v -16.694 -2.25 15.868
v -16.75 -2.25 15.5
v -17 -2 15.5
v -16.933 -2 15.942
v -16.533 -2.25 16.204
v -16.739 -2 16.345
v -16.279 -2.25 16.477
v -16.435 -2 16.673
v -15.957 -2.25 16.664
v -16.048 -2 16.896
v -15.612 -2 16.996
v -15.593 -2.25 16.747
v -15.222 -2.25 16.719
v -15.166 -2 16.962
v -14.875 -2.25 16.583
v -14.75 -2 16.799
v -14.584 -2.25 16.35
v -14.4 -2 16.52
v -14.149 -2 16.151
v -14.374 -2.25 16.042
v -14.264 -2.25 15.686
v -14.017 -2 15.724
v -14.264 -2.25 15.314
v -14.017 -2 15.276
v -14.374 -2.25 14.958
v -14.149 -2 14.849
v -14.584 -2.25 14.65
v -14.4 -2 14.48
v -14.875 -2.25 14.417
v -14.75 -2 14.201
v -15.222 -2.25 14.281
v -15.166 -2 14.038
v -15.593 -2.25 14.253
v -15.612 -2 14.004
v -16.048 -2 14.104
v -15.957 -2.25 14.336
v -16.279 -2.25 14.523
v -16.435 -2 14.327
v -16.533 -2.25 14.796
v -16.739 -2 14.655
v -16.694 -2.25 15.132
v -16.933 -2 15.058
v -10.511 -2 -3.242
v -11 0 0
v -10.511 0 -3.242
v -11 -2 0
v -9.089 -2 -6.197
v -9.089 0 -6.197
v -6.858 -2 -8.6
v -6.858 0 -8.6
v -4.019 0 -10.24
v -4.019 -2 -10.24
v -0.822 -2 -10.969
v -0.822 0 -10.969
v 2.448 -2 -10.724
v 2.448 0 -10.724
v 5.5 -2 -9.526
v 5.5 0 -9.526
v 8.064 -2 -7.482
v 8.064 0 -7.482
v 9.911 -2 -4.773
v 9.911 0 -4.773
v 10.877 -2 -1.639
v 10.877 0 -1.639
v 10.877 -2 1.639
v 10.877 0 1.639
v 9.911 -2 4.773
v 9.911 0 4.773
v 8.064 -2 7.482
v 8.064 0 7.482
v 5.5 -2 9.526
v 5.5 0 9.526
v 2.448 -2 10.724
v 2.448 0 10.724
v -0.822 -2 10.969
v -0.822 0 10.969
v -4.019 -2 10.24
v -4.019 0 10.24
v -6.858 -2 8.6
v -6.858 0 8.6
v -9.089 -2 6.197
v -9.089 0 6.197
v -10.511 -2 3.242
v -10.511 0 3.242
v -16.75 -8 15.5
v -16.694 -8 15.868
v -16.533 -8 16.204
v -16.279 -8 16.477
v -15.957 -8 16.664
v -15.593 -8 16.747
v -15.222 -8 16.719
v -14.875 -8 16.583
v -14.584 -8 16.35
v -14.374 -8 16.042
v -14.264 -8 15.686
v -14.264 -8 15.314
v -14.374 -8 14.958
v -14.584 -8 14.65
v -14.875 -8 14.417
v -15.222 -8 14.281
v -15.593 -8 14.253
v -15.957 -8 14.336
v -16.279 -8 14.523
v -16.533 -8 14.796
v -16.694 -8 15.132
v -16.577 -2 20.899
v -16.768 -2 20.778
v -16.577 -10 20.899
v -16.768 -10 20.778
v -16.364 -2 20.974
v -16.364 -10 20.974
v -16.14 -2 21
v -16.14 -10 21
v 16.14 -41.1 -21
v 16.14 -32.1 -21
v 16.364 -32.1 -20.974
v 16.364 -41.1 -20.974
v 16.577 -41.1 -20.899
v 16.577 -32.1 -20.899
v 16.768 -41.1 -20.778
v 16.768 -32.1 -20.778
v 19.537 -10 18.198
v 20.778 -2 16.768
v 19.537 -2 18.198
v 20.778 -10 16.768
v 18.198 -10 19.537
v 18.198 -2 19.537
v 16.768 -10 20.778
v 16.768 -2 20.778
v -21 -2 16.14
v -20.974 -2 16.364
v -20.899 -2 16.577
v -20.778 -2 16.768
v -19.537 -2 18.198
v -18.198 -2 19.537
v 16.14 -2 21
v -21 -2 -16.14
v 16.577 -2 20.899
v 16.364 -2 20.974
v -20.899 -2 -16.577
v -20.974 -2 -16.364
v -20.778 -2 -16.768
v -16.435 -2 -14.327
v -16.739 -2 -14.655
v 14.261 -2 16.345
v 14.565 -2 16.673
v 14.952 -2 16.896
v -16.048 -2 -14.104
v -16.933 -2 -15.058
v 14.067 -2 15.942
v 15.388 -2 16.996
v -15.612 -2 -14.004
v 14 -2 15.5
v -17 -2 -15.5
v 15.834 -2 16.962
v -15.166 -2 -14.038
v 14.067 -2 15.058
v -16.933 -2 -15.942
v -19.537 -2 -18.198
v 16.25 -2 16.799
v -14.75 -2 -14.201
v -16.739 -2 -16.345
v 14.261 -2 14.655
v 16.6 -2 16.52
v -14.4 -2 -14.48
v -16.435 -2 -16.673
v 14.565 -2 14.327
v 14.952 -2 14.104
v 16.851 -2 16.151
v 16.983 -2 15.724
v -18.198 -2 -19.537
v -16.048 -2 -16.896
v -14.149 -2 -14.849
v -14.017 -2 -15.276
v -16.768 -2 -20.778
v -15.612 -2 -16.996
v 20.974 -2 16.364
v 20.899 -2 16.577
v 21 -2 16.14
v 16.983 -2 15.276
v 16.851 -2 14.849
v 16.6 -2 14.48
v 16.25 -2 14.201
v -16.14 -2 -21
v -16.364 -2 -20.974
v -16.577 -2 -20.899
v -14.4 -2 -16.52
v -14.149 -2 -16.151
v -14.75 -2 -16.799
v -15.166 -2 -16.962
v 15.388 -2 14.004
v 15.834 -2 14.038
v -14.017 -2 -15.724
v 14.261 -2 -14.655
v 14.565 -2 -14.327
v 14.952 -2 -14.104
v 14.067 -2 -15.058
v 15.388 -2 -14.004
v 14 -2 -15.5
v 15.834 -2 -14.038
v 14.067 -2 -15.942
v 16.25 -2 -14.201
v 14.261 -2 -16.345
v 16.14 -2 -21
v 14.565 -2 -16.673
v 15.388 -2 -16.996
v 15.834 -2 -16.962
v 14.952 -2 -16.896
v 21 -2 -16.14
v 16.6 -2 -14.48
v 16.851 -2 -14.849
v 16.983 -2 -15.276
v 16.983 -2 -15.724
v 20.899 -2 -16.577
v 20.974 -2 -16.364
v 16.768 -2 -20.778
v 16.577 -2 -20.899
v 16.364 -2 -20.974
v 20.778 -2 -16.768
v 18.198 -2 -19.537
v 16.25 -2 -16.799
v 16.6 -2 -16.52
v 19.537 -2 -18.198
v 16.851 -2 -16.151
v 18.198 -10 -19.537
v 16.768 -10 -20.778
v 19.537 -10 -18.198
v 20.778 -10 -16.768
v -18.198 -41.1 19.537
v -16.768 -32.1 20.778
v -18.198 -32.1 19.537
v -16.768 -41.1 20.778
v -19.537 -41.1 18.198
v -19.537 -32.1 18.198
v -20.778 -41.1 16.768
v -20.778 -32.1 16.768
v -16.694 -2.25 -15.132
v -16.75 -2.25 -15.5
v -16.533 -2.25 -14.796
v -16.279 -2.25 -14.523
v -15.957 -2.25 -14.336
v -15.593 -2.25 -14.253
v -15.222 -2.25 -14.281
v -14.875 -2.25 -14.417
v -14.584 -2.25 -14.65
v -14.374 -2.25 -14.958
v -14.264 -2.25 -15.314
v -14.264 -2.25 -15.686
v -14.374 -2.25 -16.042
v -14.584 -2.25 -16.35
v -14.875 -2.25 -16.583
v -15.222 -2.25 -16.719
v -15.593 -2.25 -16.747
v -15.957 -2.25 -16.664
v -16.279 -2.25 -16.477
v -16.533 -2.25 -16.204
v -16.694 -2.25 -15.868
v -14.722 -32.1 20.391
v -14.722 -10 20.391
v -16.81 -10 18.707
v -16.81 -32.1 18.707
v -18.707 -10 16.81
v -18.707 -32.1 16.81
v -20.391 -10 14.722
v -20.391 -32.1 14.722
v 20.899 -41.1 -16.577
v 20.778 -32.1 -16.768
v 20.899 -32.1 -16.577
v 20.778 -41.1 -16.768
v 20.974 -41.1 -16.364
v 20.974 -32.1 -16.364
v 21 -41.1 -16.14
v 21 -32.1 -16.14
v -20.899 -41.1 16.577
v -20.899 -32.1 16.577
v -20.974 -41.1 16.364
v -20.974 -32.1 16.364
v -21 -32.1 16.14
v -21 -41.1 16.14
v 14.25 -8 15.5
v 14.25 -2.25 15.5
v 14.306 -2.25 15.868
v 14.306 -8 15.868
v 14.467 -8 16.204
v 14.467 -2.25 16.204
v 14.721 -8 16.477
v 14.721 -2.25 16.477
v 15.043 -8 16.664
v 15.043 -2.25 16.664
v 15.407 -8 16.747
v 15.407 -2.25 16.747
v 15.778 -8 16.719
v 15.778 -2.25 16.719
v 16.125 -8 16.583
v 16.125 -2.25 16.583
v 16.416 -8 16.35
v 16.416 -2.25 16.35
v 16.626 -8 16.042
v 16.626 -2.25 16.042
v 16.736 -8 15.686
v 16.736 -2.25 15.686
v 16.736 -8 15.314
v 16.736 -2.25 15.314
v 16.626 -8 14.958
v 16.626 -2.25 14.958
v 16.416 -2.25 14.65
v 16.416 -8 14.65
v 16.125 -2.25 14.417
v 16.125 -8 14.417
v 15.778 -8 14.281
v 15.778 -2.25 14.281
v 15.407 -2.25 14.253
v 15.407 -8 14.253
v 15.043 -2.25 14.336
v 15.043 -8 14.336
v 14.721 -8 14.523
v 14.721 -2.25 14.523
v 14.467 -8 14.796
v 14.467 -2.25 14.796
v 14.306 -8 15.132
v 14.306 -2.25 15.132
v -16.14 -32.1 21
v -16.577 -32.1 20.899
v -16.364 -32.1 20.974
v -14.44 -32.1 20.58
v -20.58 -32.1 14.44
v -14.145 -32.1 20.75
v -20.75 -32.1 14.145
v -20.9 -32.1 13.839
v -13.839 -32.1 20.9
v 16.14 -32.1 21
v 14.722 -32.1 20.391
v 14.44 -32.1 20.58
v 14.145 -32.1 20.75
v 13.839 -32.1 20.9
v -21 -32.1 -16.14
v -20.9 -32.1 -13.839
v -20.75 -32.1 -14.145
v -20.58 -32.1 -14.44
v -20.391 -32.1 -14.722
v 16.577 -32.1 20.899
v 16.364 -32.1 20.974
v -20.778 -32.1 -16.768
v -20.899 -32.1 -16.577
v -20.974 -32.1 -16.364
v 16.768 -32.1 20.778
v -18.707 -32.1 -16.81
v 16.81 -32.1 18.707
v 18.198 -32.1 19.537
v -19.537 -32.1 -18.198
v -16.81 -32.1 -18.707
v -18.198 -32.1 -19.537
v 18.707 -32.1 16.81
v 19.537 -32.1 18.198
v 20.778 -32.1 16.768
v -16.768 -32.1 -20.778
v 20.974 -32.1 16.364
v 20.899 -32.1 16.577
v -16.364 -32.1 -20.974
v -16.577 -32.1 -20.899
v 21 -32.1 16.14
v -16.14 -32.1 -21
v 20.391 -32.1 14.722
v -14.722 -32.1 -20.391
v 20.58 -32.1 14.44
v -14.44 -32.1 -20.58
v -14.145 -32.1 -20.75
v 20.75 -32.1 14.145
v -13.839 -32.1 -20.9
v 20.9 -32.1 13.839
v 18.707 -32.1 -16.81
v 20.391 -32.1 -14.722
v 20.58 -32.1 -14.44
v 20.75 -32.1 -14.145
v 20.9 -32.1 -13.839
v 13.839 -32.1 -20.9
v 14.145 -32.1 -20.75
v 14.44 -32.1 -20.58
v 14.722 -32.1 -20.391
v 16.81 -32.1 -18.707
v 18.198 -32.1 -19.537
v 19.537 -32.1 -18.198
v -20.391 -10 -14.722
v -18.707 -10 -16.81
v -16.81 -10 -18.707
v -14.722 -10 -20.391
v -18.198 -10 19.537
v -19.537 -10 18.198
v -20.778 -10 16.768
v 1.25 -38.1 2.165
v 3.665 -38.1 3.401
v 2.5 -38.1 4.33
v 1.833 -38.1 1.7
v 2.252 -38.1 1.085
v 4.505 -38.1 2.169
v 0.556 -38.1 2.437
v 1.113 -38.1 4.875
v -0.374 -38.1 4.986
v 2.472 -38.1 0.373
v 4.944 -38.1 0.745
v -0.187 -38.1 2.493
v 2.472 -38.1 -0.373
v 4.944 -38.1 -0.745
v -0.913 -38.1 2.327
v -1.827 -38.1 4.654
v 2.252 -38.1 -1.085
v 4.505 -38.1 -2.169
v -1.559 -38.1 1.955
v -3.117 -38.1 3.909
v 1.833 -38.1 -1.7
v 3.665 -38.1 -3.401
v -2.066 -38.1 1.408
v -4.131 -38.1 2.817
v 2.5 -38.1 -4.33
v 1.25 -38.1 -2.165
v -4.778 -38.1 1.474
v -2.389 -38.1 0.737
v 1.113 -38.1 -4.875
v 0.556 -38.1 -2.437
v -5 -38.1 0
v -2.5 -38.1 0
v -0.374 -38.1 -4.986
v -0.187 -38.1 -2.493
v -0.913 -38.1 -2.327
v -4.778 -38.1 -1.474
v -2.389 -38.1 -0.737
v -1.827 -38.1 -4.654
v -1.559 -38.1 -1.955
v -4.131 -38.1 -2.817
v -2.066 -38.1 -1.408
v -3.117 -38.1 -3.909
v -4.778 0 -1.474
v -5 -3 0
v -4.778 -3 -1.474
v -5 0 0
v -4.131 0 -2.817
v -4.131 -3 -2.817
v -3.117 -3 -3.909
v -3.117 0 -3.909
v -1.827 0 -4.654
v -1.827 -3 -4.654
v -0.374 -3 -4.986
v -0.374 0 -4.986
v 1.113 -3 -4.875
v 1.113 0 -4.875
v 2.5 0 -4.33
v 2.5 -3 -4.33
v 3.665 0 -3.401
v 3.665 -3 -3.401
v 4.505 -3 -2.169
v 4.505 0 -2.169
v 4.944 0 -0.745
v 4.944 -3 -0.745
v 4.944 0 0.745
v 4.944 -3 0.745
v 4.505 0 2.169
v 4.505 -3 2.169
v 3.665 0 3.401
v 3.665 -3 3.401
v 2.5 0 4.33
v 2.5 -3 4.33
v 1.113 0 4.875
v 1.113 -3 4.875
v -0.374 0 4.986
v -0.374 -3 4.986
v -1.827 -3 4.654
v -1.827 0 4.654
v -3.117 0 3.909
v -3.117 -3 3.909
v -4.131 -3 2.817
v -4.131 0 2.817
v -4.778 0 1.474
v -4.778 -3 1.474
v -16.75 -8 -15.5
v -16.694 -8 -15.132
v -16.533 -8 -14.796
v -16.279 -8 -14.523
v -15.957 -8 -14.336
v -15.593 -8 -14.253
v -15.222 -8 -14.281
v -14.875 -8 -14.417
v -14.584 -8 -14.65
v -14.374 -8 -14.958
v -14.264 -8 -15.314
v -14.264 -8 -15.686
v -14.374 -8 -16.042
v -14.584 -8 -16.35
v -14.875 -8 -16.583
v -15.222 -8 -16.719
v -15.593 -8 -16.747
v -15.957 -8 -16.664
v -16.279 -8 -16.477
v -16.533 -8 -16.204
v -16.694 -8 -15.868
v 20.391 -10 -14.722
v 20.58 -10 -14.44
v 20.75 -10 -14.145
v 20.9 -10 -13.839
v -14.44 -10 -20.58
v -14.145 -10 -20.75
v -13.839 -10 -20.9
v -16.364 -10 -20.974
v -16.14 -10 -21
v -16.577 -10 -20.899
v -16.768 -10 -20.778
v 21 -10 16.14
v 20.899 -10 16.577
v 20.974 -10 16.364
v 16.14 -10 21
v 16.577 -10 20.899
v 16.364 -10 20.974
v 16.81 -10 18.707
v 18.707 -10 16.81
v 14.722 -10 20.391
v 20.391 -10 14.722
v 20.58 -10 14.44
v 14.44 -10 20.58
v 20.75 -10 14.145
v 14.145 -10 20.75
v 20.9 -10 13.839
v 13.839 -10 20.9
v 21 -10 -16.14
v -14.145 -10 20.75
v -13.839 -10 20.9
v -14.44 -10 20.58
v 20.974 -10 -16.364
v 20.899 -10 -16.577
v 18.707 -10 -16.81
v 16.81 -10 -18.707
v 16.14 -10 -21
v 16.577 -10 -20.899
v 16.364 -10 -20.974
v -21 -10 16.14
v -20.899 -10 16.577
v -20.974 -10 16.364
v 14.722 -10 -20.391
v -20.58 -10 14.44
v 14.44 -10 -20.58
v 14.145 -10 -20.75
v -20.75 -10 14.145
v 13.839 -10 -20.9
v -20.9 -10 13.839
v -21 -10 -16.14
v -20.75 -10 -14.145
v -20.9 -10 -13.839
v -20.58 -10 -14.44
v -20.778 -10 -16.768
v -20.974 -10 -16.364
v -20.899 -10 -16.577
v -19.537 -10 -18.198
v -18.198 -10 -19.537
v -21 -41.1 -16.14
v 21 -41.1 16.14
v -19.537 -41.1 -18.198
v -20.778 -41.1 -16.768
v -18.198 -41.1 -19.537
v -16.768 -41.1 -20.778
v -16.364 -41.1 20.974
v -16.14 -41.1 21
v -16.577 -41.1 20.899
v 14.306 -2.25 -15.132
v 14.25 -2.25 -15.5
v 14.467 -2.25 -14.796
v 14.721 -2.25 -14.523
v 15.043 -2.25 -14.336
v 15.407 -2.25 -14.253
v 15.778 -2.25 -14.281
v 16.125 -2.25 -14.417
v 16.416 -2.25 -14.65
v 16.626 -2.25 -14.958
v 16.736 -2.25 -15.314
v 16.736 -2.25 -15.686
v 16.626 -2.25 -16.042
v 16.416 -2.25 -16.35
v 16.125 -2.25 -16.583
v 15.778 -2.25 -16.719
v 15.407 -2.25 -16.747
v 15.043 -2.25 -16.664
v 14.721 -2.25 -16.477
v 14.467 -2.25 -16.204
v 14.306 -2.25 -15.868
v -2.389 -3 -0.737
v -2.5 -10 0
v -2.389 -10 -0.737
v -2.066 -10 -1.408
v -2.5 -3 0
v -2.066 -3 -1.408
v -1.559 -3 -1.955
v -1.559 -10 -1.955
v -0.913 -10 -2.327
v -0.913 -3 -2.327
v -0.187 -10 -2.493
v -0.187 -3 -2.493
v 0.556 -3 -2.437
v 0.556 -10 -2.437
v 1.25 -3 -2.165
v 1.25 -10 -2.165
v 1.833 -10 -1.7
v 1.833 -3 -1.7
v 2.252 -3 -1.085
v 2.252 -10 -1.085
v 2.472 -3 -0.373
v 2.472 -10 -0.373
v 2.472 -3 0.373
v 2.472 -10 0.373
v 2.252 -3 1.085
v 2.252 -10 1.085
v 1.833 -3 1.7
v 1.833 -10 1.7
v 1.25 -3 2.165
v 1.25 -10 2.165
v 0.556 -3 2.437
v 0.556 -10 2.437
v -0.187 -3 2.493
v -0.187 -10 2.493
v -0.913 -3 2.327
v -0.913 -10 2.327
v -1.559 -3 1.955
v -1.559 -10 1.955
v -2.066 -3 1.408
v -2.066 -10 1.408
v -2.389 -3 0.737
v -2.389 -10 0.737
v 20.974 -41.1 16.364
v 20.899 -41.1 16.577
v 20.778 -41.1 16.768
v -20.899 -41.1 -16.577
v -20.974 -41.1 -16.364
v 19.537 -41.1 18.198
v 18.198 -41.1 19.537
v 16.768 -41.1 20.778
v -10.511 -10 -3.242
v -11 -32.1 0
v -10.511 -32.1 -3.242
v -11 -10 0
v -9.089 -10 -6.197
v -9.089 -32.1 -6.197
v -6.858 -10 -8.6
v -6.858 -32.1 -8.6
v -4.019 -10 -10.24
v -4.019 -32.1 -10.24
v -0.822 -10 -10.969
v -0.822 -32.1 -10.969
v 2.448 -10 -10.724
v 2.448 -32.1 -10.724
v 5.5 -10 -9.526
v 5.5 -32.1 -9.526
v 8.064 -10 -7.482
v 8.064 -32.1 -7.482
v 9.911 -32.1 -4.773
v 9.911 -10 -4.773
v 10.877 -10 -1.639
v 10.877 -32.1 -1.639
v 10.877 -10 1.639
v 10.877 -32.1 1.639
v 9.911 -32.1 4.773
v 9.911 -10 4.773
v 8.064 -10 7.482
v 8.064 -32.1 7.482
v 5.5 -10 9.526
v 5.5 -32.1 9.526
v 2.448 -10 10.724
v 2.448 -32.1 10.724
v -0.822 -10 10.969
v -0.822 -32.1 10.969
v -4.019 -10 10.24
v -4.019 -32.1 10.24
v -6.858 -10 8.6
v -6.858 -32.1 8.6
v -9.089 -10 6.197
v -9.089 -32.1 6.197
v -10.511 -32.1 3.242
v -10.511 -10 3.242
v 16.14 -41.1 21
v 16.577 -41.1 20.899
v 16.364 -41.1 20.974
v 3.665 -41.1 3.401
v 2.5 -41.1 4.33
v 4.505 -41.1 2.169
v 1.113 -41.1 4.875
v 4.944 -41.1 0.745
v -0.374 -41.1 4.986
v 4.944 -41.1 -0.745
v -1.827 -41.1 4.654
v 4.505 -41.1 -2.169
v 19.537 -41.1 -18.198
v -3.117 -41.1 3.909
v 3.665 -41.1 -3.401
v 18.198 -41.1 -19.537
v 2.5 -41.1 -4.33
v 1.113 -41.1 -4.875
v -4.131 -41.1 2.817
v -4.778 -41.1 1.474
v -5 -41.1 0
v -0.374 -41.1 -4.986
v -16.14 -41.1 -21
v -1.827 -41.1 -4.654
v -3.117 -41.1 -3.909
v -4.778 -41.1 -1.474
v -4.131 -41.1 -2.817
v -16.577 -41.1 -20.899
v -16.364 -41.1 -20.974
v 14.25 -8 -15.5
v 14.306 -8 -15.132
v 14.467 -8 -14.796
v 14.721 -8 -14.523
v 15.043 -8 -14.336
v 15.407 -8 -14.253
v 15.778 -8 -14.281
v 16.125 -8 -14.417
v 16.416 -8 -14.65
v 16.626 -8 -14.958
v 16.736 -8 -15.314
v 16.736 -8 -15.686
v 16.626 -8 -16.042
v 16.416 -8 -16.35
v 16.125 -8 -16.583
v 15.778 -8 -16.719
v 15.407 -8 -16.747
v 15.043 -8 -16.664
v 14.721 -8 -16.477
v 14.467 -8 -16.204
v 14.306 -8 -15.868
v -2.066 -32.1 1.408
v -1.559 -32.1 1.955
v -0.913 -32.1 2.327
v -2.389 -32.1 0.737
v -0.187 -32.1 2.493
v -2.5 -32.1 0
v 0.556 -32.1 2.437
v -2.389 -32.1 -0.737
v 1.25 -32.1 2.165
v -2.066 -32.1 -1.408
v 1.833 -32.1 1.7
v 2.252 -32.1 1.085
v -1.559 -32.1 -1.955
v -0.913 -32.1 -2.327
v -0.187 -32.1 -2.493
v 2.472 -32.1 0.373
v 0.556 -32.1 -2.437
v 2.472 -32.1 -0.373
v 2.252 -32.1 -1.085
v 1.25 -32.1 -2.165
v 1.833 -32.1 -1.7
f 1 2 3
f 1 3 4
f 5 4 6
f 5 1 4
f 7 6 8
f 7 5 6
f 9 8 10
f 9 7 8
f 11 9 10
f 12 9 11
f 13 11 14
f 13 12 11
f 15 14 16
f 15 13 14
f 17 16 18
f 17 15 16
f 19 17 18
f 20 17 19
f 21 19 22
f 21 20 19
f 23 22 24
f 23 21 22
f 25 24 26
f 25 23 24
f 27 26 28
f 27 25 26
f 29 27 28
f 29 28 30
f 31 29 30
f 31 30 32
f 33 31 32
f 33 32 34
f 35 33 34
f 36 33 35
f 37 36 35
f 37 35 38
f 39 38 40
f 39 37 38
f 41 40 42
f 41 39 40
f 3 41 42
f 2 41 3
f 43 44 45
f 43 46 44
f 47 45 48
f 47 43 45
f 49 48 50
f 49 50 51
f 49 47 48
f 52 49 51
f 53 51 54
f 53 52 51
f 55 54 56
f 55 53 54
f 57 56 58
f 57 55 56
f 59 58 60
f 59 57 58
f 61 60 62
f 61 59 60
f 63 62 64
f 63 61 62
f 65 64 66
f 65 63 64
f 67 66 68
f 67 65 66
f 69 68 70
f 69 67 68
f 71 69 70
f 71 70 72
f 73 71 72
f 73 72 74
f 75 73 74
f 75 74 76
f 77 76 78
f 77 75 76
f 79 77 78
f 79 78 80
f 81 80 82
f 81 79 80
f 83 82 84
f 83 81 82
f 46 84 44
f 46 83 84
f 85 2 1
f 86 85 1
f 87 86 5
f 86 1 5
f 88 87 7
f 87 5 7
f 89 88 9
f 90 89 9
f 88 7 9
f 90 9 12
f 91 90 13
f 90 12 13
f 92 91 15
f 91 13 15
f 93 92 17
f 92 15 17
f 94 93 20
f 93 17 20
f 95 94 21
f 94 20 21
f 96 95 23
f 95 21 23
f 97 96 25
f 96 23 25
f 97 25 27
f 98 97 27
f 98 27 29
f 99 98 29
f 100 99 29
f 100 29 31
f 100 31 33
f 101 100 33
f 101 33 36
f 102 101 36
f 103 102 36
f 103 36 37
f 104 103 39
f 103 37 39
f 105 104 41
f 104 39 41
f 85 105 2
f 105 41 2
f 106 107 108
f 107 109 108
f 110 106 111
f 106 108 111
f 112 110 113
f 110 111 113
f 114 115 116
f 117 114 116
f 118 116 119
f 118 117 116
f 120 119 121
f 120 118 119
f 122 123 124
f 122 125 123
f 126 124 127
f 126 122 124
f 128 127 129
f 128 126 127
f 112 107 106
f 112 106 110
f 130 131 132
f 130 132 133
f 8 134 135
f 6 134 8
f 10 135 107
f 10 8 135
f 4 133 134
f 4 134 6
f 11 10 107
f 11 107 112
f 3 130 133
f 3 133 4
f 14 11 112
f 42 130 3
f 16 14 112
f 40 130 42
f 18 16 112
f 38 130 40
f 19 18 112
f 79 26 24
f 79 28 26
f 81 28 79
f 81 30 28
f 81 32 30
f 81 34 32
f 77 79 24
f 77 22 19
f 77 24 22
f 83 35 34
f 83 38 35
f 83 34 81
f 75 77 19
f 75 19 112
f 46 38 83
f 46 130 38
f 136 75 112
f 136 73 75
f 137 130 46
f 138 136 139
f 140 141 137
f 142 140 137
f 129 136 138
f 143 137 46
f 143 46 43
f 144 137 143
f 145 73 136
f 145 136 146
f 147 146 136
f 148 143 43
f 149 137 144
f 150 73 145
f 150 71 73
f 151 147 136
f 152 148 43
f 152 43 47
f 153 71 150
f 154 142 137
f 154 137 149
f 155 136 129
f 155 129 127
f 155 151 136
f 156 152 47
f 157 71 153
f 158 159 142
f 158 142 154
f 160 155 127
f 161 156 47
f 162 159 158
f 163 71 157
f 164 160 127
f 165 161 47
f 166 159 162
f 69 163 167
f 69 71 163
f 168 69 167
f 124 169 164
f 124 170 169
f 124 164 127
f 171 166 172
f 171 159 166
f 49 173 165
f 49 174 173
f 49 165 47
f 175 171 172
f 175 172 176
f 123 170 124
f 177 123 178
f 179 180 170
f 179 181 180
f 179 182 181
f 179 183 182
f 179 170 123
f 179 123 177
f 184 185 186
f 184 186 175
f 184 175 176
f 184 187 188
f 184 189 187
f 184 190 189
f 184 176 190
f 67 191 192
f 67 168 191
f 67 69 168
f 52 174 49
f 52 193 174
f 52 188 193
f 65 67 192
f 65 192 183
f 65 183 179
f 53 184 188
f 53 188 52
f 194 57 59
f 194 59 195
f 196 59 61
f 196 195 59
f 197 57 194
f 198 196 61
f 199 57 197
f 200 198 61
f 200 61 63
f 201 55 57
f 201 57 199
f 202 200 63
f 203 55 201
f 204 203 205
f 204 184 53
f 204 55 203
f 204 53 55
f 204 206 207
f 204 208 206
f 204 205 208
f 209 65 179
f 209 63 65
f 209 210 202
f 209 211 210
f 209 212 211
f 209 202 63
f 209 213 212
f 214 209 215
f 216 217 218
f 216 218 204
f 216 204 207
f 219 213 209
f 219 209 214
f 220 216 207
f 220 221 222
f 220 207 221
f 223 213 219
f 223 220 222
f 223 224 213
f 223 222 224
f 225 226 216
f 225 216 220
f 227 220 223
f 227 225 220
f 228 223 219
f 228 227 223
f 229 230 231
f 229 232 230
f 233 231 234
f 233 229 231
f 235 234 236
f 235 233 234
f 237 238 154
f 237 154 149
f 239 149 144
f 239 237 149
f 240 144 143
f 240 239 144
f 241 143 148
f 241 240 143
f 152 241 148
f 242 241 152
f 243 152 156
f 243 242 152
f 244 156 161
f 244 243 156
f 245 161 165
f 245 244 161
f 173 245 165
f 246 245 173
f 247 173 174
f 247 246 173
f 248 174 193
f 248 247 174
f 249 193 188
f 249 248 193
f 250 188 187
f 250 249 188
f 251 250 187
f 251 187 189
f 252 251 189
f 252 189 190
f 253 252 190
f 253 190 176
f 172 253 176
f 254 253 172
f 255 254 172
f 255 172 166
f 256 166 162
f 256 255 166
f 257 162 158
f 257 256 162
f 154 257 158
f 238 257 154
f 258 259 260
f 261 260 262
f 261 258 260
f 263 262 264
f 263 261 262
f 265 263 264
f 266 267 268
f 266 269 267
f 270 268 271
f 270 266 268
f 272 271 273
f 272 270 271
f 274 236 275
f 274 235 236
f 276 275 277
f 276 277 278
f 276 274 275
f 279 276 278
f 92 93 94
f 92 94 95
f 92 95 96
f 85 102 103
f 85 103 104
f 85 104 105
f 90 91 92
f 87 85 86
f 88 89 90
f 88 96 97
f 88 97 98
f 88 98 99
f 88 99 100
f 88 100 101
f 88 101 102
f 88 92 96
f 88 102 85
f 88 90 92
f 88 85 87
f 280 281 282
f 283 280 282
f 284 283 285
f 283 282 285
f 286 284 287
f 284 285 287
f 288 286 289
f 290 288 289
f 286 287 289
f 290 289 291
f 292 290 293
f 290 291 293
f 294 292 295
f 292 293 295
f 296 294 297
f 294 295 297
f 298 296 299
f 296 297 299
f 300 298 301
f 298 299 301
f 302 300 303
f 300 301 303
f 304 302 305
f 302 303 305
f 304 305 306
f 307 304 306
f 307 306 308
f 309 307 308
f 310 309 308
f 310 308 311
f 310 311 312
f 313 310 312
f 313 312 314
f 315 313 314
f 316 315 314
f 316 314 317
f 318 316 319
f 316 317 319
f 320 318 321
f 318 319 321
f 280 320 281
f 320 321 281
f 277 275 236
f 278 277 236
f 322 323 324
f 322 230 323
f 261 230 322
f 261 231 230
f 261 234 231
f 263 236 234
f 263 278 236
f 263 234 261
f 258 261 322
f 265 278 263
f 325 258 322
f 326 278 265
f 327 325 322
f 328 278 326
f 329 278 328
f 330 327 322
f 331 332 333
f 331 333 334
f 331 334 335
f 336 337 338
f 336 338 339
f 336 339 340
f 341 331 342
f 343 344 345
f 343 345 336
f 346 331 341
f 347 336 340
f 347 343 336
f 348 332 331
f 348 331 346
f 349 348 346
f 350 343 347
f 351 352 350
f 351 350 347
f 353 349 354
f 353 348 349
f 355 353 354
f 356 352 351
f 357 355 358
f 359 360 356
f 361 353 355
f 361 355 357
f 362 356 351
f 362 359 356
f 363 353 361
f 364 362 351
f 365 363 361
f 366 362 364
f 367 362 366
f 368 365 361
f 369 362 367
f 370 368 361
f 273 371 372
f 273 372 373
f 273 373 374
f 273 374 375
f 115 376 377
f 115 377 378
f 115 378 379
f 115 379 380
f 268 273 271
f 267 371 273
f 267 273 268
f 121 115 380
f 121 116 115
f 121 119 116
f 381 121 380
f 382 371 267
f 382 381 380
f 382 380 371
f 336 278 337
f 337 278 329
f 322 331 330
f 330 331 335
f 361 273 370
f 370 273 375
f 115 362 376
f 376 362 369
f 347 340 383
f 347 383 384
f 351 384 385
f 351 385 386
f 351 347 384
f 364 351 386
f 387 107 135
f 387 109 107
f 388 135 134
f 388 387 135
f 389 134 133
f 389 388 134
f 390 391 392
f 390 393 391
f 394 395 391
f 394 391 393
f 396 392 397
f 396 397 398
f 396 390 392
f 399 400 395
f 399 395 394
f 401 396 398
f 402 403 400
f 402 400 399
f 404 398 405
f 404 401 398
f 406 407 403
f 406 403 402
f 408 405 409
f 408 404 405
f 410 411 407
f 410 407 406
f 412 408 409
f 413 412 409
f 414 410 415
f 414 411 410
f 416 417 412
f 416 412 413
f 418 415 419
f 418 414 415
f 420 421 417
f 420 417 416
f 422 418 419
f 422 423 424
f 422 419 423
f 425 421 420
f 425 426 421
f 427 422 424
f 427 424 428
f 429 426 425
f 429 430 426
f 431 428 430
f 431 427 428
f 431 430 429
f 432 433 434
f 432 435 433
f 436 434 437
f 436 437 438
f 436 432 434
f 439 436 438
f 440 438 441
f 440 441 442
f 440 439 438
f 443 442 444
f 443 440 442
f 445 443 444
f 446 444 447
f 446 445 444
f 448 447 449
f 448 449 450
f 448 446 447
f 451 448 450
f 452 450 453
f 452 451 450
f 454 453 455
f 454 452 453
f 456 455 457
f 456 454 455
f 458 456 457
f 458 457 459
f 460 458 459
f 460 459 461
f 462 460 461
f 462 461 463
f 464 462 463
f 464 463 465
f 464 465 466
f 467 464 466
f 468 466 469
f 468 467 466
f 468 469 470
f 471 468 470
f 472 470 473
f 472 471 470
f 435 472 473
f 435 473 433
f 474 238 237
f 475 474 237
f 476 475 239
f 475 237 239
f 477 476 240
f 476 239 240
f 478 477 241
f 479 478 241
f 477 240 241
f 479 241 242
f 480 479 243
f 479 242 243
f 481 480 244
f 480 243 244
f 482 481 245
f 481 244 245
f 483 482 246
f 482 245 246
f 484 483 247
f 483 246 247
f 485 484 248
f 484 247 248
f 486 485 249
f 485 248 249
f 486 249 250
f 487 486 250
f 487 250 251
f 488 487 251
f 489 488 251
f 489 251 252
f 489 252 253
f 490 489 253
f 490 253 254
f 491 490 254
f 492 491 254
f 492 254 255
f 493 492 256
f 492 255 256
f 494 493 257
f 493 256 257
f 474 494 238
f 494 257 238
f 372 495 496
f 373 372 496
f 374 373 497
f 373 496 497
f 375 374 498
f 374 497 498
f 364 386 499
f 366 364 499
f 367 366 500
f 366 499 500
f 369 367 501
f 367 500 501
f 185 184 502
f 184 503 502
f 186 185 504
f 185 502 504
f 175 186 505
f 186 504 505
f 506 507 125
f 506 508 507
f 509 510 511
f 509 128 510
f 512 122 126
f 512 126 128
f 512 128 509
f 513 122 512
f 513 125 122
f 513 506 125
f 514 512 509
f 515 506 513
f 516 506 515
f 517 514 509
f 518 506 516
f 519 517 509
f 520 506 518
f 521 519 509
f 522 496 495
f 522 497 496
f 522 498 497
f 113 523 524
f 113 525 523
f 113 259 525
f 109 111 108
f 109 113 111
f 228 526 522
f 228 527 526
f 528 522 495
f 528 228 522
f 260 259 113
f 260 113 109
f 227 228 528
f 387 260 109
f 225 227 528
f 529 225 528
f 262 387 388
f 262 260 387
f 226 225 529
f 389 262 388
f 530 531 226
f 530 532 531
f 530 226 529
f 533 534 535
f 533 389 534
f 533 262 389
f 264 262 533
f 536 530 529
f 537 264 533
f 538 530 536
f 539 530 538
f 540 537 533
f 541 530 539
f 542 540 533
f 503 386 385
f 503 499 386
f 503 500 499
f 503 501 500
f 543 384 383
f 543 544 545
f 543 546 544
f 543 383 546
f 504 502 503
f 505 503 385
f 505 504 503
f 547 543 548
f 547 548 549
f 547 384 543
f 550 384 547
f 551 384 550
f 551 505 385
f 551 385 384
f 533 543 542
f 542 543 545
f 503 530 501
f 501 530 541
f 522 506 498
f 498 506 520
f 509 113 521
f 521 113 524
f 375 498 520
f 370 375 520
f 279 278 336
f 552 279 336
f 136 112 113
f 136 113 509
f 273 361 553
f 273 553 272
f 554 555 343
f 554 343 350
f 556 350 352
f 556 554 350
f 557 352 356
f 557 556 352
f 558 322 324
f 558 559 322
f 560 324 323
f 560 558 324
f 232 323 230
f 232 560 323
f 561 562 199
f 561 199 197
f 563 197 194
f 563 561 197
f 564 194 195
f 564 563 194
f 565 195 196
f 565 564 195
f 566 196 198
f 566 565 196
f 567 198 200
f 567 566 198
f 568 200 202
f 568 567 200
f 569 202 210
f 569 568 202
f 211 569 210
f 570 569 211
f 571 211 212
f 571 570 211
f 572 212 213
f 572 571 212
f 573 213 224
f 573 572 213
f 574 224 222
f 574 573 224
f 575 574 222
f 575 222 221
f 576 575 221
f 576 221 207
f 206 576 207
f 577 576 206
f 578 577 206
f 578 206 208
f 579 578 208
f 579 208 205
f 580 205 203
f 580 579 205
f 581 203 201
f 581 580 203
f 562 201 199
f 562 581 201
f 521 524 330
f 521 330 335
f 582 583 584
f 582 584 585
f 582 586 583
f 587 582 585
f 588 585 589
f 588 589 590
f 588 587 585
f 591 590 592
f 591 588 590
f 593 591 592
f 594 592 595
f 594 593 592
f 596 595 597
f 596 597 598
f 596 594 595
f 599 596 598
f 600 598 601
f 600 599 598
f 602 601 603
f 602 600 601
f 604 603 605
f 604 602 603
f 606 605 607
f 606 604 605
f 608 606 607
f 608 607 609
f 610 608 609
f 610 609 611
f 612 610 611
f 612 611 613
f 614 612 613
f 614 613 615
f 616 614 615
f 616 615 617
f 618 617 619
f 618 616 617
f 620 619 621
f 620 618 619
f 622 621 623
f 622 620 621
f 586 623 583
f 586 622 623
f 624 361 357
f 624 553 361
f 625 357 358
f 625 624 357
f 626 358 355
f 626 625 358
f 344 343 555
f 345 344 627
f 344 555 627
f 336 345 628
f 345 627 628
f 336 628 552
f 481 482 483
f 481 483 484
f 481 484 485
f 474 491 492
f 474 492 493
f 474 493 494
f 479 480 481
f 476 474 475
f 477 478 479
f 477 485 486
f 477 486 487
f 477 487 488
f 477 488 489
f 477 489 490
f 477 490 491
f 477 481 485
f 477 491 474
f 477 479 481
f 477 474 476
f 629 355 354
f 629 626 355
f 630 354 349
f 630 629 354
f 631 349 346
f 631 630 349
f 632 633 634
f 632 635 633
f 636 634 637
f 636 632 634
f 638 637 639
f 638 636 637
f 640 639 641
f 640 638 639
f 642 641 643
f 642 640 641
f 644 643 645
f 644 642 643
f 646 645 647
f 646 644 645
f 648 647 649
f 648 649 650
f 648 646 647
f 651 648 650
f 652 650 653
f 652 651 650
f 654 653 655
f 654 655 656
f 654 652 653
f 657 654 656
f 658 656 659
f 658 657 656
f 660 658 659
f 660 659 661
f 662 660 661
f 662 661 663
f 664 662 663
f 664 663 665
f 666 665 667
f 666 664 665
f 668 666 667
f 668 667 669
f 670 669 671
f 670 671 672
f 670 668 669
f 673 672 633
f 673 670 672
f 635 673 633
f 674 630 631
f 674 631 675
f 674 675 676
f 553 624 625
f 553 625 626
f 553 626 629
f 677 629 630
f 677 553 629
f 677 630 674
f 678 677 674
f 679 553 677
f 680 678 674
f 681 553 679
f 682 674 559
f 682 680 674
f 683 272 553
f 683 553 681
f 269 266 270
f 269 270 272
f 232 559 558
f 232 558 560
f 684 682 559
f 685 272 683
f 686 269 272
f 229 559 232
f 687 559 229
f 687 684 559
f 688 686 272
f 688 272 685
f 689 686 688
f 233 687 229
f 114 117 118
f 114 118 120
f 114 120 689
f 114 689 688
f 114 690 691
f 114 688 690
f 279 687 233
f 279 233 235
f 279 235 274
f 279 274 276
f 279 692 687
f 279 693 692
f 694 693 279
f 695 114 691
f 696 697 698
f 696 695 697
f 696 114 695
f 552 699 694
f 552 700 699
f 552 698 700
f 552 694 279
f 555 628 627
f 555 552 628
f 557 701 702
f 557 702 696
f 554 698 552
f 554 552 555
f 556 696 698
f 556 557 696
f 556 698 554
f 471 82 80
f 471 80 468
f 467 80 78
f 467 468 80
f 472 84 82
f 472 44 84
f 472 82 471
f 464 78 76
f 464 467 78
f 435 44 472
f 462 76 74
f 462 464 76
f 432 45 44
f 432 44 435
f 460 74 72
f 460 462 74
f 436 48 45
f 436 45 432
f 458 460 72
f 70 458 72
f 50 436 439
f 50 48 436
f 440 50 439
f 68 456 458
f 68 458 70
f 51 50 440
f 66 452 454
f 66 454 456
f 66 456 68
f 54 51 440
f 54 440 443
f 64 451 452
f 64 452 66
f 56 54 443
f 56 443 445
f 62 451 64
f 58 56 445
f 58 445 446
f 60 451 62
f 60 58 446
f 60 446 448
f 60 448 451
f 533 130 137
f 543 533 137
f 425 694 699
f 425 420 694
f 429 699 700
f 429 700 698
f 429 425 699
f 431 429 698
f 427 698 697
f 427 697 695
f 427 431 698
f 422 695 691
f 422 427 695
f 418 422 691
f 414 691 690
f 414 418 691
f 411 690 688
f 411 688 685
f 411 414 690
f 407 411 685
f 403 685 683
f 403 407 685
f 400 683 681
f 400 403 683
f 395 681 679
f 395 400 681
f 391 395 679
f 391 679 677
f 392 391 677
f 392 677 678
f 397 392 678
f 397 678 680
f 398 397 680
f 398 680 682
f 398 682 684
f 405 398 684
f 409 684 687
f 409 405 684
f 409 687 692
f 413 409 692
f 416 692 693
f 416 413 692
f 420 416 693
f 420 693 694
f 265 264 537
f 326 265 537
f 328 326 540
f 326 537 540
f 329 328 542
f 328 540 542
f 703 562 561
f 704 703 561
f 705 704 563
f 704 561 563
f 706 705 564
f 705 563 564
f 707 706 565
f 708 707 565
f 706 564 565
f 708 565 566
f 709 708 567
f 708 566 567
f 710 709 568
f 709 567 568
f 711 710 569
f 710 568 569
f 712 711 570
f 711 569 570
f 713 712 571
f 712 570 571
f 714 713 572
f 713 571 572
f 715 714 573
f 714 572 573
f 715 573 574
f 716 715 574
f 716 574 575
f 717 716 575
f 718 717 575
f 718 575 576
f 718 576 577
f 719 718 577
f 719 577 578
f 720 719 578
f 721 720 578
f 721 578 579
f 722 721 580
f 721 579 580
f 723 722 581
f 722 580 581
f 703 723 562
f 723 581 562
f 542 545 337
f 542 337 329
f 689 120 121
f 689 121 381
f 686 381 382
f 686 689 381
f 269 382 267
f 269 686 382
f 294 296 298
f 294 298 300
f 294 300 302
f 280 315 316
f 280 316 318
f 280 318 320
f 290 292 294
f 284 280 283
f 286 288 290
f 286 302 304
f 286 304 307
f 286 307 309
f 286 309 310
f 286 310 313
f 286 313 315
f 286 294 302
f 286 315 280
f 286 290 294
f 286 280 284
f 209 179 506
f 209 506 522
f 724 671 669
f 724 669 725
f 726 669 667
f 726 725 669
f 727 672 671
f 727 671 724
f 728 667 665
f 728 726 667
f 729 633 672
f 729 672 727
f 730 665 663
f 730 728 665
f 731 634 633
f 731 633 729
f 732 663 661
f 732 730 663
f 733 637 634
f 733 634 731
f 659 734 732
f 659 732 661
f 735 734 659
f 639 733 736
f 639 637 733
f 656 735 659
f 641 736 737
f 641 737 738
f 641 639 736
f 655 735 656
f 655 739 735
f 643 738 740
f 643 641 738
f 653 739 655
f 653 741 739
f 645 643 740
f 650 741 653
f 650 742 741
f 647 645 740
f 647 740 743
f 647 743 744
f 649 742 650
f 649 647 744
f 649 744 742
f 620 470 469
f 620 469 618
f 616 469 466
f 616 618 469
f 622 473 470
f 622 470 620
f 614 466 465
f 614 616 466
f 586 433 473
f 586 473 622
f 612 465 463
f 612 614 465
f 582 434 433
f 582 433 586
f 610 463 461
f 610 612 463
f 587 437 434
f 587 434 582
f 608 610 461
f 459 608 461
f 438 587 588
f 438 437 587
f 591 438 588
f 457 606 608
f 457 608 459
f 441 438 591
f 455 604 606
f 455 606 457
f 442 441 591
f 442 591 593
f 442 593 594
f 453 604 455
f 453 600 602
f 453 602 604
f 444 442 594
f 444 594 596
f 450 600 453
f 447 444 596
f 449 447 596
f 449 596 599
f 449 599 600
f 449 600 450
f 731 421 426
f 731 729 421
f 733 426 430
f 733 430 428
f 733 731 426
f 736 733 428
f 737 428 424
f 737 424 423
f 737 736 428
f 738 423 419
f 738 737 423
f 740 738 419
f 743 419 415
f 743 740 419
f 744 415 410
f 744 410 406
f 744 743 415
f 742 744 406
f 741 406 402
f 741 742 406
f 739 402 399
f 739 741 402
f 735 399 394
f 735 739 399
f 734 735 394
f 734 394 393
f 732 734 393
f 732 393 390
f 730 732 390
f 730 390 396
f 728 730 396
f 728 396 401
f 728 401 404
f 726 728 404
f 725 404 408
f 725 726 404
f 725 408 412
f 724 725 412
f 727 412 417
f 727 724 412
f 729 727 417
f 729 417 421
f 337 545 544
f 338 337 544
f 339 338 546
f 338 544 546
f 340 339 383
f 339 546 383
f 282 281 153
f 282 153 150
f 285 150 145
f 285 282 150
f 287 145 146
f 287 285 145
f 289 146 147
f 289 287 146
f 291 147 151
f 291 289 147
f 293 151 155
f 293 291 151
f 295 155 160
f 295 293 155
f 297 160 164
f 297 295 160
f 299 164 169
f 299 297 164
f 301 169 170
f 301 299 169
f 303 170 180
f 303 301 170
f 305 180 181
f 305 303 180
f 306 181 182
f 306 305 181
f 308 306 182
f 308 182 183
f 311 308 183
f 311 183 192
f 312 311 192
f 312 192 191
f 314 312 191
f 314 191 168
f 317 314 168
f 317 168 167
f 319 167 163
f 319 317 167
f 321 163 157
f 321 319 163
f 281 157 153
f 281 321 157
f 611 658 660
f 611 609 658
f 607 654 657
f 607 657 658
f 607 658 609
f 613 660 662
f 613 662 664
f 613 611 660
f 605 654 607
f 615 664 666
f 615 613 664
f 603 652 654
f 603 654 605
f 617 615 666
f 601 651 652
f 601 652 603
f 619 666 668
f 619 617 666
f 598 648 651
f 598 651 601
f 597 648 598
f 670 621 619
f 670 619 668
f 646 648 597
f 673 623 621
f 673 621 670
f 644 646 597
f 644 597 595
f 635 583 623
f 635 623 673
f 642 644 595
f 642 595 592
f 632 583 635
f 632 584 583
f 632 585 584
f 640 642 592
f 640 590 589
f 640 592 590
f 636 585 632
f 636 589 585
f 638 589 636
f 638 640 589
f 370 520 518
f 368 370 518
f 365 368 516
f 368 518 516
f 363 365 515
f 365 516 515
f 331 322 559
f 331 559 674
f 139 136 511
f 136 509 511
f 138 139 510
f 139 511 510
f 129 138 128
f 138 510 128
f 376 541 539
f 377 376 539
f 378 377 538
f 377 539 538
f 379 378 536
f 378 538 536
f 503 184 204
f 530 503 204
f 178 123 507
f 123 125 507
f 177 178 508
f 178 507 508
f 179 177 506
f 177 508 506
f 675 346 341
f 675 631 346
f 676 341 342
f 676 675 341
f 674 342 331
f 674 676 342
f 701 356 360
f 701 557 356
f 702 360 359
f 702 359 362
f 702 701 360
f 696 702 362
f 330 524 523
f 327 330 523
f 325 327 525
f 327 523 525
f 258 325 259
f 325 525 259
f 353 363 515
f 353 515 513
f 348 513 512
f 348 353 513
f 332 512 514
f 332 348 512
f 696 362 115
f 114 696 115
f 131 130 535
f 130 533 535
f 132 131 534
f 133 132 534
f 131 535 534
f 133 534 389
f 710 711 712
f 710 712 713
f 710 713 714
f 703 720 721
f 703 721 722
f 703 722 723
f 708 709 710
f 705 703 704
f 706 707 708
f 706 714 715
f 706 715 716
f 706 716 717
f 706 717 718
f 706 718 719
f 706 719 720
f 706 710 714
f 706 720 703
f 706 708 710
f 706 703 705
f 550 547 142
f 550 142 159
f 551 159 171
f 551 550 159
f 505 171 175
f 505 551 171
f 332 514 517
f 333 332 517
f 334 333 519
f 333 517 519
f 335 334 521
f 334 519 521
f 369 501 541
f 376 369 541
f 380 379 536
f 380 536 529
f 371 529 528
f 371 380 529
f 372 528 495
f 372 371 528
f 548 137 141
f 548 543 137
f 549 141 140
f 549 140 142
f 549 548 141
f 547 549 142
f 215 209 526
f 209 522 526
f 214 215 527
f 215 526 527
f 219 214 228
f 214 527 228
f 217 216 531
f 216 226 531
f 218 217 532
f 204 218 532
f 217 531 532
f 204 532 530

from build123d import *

# Parameters (mm, degrees)
SKETCH2_W          = 55
SKETCH2_H          = 55
SKETCH2_W_2        = 42
SKETCH2_H_2        = 42
CUT_EXTRUDE1_DEPTH = 55.356140408
SKETCH3_W          = 0.1
SKETCH3_H          = 27.678330874
SKETCH3_W_2        = 27.678330874
SKETCH3_H_2        = 0.1
CUT_EXTRUDE2_DEPTH = 22.1
FILLET9_R          = 5
FILLET10_R         = 1
SKETCH4_R          = 1.25
CUT_EXTRUDE3_DEPTH = 6
CHAMFER1_SIZE      = 0.25


with BuildPart() as part:
    # Sketch1 → Revolve1 (revolve)
    with BuildSketch(Plane.XY, mode=Mode.PRIVATE) as revolve1_sk:
        Polygon((5, 0), (11, 0), (11, -2), (26.7, -2), (26.7, -10), (25.15, -10), (25.15, -32.1), (26.7, -32.1), (26.7, -41.1), (5, -41.1), (5, -38.1), (2.5, -38.1), (2.5, -32.1), (11, -32.1), (11, -10), (2.5, -10), (2.5, -3), (5, -3), align=None)
    revolve(revolve1_sk.sketch.rotate(Axis((0, 0, 0), (0, -1, 0)), 180), axis=Axis((0, 0, 0), (0, -1, 0)))

    # Sketch2 → Cut-Extrude1 (cut, through all)
    with BuildSketch(Plane(origin=(0, -2, 0), x_dir=(1, 0, 0), z_dir=(0, 1, 0))):
        Rectangle(SKETCH2_W, SKETCH2_H)
        Rectangle(SKETCH2_W_2, SKETCH2_H_2, mode=Mode.SUBTRACT)
    extrude(amount=-CUT_EXTRUDE1_DEPTH, mode=Mode.SUBTRACT)

    # Sketch3 → Cut-Extrude2 (cut)
    with BuildSketch(Plane.XZ.offset(10)):
        with Locations((-20.95, 0)):
            Rectangle(SKETCH3_W, SKETCH3_H)
        with Locations((0, -20.95)):
            Rectangle(SKETCH3_W_2, SKETCH3_H_2)
        with Locations((20.95, 0)):
            Rectangle(SKETCH3_W, SKETCH3_H)
        with Locations((0, 20.95)):
            Rectangle(SKETCH3_W_2, SKETCH3_H_2)
    extrude(amount=CUT_EXTRUDE2_DEPTH, mode=Mode.SUBTRACT)

    # Fillet9
    # the kernel refuses this fillet: 5 mm, written as the material it takes off along each edge
    with BuildSketch(Plane(origin=(13.839165437, -10, -21), x_dir=(0.8230603738236033, 0, 0.5679538898901478), z_dir=(0, -1, 0)), Plane(origin=(21, -10, 13.839165437), x_dir=(-0.5679538898901461, 0, 0.8230603738236048), z_dir=(0, -1, 0)), Plane(origin=(-13.839165437, -10, 21), x_dir=(-0.8230603738236049, 0, -0.5679538898901455), z_dir=(0, -1, 0)), Plane(origin=(-21, -10, -13.839165437), x_dir=(0.567953889890148, 0, -0.8230603738236033), z_dir=(0, -1, 0))) as fillet9_piece_1:
        with BuildLine():
            CenterArc((0.966453452, 4.998861967), FILLET9_R, 259.51770896, 11.704761359)
            Line((0.056795389, 0.082306037), (0, 0))
            ThreePointArc((0, 0), (0.536563009, -0.005724307), (1.073126019, 0))
        make_face()
    extrude(amount=22.1, mode=Mode.SUBTRACT)
    with BuildSketch(Plane(origin=(21, -10, -13.839165437), x_dir=(-0.5679538898901492, 0, -0.8230603738236025), z_dir=(0, -1, 0)), Plane(origin=(13.839165437, -10, 21), x_dir=(0.8230603738236021, 0, -0.5679538898901498), z_dir=(0, -1, 0)), Plane(origin=(-21, -10, 13.839165437), x_dir=(0.5679538898901505, 0, 0.8230603738236016), z_dir=(0, -1, 0)), Plane(origin=(-13.839165437, -10, -21), x_dir=(-0.8230603738236021, 0, 0.5679538898901498), z_dir=(0, -1, 0))) as fillet9_piece_2:
        with BuildLine():
            CenterArc((0.966453452, -4.998861967), FILLET9_R, 88.777529681, 11.704761359)
            Line((0.056795389, -0.082306037), (0, 0))
            ThreePointArc((0, 0), (0.536563009, 0.005724307), (1.073126019, 0))
        make_face()
    extrude(amount=22.1, mode=Mode.SUBTRACT)

    # Fillet10
    fillet10_edges = [part.edges().sort_by_distance(p)[0] for p in [
        (21, -36.6, -16.4890873),
        (21, -6, -16.4890873),
        (16.4890873, -36.6, 21),
        (16.4890873, -6, 21),
        (-21, -36.6, 16.4890873),
        (-21, -6, 16.4890873),
        (-16.4890873, -36.6, -21),
        (-16.4890873, -6, -21),
        (21, -36.6, 16.4890873),
        (21, -6, 16.4890873),
        (-16.4890873, -36.6, 21),
        (-16.4890873, -6, 21),
        (-21, -36.6, -16.4890873),
        (-21, -6, -16.4890873),
        (16.4890873, -36.6, -21),
        (16.4890873, -6, -21),
    ]]
    fillet(fillet10_edges, radius=FILLET10_R)

    # Sketch4 → Cut-Extrude3 (cut)
    with BuildSketch(Plane(origin=(0, -2, 0), x_dir=(1, 0, 0), z_dir=(0, 1, 0))):
        with Locations(Location((-15.5, 15.5, 0), (0, 0, 180))):
            Circle(SKETCH4_R)
        with Locations(Location((15.5, 15.5, 0), (0, 0, 180))):
            Circle(SKETCH4_R)
        with Locations(Location((15.5, -15.5, 0), (0, 0, 180))):
            Circle(SKETCH4_R)
        with Locations(Location((-15.5, -15.5, 0), (0, 0, 180))):
            Circle(SKETCH4_R)
    extrude(amount=-CUT_EXTRUDE3_DEPTH, mode=Mode.SUBTRACT)

    # Chamfer1
    chamfer1_edges = [part.edges().sort_by_distance(p)[0] for p in [
        (-14.25, -2, -15.5),
        (16.75, -2, -15.5),
        (16.75, -2, 15.5),
        (-14.25, -2, 15.5),
    ]]
    chamfer(chamfer1_edges, length=CHAMFER1_SIZE)


solid = part.part
